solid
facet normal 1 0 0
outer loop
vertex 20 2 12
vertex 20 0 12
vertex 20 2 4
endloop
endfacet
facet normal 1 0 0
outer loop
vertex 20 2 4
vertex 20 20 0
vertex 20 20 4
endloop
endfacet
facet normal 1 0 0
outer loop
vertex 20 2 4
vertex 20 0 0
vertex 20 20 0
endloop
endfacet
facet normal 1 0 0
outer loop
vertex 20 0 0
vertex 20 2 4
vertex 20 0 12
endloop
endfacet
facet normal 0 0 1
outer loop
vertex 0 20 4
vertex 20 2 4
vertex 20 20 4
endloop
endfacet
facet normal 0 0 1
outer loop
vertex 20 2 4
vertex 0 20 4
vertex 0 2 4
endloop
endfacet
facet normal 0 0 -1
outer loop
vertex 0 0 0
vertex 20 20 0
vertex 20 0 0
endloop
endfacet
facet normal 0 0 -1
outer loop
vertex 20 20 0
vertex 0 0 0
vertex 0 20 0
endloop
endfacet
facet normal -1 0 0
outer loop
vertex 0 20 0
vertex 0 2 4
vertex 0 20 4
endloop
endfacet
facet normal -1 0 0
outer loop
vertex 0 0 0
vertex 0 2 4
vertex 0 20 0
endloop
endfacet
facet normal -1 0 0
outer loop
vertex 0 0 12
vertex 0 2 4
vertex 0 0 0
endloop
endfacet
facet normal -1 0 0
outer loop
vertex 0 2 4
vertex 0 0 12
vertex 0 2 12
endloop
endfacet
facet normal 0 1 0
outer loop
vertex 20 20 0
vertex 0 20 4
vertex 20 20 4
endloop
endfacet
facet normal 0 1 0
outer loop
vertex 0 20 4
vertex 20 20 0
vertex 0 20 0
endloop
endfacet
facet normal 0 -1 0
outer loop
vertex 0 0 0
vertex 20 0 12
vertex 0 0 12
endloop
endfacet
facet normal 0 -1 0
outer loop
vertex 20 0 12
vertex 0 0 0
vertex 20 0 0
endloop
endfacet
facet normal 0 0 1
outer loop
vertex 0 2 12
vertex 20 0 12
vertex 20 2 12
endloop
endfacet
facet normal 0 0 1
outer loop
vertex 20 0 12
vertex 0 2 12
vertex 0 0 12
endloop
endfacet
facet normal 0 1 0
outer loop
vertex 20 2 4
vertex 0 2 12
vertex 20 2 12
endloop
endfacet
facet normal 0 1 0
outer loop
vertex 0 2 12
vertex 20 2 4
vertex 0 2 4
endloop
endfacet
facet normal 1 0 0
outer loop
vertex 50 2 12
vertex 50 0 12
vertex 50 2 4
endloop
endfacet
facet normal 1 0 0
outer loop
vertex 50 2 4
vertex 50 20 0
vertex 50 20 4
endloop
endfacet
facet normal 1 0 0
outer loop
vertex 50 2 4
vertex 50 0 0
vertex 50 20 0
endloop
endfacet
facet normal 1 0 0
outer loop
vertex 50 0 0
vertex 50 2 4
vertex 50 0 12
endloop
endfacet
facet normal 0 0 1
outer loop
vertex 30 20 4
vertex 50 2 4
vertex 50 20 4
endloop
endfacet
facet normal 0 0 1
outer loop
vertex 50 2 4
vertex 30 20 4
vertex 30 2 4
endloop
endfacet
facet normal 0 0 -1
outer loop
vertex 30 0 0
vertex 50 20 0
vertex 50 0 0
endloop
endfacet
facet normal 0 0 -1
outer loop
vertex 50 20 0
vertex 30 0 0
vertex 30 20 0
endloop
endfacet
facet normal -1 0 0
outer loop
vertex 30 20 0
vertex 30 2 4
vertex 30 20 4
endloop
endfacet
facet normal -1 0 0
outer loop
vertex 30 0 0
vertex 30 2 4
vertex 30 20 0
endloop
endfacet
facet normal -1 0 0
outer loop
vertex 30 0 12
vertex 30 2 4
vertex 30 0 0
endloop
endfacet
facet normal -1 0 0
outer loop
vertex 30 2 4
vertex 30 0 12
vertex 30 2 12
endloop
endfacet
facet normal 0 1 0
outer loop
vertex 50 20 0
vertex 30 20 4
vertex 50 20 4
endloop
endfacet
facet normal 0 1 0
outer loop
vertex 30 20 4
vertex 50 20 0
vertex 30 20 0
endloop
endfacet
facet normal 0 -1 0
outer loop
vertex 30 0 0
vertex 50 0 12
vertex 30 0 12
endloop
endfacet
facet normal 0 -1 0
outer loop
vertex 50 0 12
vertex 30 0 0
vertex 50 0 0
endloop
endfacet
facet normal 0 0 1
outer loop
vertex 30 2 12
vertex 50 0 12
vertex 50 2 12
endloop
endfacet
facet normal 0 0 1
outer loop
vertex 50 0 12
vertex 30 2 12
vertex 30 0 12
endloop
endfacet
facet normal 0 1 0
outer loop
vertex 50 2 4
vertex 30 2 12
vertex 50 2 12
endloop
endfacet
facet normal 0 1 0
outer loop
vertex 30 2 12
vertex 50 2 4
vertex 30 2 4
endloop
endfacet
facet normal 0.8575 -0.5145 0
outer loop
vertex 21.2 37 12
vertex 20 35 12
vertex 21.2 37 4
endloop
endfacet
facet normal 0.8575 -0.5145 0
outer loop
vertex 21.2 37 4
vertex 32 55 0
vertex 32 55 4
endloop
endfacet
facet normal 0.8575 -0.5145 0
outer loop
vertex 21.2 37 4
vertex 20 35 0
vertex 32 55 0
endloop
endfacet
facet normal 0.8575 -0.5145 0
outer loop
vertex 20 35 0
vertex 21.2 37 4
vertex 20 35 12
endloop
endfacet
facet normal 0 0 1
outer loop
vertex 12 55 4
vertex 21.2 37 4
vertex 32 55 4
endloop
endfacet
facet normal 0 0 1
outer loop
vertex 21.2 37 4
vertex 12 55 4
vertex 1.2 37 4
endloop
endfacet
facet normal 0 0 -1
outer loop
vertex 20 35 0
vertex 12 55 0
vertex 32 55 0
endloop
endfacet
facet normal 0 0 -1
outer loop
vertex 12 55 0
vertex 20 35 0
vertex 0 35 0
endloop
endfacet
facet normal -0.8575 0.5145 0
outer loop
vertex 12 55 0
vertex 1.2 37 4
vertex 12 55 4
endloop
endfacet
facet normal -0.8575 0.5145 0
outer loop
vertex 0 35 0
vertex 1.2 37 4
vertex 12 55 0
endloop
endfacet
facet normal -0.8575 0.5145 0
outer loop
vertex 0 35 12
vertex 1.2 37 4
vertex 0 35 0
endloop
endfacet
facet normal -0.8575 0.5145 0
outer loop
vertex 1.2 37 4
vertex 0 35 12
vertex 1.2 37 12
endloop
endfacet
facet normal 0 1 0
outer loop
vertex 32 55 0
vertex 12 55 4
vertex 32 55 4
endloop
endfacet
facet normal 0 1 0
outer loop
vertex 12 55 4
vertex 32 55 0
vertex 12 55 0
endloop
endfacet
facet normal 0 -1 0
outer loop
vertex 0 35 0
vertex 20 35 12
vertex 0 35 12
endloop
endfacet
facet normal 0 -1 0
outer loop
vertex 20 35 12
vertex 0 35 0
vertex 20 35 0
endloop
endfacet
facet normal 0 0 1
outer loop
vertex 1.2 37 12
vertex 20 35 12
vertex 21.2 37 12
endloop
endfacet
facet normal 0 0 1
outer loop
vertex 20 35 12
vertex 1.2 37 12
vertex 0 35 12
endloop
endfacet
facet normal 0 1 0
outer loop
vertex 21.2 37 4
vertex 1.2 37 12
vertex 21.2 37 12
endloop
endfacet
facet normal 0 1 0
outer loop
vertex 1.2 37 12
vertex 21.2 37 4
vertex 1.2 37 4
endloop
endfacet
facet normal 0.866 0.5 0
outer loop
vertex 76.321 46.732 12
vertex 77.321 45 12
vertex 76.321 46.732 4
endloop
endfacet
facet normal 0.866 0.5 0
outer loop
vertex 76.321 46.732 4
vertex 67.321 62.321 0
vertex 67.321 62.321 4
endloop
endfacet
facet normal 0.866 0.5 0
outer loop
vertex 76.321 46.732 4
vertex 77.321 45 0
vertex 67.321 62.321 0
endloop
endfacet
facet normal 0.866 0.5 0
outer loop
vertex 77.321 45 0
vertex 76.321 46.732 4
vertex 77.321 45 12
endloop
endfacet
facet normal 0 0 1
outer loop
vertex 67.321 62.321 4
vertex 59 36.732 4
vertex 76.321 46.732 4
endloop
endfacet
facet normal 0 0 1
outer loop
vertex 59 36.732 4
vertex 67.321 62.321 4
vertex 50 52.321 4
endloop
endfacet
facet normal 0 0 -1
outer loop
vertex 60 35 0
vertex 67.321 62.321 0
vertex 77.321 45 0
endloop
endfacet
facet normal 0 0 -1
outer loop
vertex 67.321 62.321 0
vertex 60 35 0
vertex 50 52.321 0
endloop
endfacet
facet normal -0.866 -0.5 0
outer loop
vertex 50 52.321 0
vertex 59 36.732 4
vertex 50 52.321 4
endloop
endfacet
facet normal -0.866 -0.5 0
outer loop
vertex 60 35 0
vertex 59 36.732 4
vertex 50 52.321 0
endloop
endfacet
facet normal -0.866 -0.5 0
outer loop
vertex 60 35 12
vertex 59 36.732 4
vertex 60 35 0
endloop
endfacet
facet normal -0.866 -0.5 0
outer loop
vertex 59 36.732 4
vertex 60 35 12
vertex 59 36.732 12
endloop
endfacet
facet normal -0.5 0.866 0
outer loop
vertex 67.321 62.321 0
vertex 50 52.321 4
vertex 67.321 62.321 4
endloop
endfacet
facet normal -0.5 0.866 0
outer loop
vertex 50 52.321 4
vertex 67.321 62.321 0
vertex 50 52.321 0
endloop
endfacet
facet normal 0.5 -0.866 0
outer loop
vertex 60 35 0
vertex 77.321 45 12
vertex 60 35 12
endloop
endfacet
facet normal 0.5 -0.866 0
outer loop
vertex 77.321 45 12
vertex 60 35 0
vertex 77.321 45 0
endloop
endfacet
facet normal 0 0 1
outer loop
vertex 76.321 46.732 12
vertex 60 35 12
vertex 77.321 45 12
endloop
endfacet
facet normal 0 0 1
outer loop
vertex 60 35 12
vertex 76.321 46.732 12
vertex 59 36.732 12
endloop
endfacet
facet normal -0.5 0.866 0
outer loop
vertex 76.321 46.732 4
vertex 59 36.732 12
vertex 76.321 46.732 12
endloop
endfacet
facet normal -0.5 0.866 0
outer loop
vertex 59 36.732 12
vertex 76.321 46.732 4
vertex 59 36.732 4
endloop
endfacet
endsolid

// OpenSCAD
// multmatrix(): the transform every other transform is made of.
//
// A 4x3 (or 4x4) matrix: the left 3x3 rotates, scales and shears, the
// last column translates. Useful when you have a matrix already, and the
// only way to shear at all.

module marker() {
    cube([20, 20, 4]);
    color("tomato") cube([20, 2, 12]);
}

marker();

// Translation, spelled out: the same as translate([30, 0, 0]).
multmatrix([[1, 0, 0, 30],
            [0, 1, 0,  0],
            [0, 0, 1,  0]]) marker();

// A shear -- x leaning with y. No other transform will do this.
translate([0, 35, 0])
    multmatrix([[1, 0.6, 0, 0],
                [0, 1,   0, 0],
                [0, 0,   1, 0]]) marker();

// Rotation about Z, written out, the same as rotate([0, 0, 30]).
translate([60, 35, 0])
    multmatrix([[cos(30), -sin(30), 0, 0],
                [sin(30),  cos(30), 0, 0],
                [0,        0,       1, 0]]) marker();
